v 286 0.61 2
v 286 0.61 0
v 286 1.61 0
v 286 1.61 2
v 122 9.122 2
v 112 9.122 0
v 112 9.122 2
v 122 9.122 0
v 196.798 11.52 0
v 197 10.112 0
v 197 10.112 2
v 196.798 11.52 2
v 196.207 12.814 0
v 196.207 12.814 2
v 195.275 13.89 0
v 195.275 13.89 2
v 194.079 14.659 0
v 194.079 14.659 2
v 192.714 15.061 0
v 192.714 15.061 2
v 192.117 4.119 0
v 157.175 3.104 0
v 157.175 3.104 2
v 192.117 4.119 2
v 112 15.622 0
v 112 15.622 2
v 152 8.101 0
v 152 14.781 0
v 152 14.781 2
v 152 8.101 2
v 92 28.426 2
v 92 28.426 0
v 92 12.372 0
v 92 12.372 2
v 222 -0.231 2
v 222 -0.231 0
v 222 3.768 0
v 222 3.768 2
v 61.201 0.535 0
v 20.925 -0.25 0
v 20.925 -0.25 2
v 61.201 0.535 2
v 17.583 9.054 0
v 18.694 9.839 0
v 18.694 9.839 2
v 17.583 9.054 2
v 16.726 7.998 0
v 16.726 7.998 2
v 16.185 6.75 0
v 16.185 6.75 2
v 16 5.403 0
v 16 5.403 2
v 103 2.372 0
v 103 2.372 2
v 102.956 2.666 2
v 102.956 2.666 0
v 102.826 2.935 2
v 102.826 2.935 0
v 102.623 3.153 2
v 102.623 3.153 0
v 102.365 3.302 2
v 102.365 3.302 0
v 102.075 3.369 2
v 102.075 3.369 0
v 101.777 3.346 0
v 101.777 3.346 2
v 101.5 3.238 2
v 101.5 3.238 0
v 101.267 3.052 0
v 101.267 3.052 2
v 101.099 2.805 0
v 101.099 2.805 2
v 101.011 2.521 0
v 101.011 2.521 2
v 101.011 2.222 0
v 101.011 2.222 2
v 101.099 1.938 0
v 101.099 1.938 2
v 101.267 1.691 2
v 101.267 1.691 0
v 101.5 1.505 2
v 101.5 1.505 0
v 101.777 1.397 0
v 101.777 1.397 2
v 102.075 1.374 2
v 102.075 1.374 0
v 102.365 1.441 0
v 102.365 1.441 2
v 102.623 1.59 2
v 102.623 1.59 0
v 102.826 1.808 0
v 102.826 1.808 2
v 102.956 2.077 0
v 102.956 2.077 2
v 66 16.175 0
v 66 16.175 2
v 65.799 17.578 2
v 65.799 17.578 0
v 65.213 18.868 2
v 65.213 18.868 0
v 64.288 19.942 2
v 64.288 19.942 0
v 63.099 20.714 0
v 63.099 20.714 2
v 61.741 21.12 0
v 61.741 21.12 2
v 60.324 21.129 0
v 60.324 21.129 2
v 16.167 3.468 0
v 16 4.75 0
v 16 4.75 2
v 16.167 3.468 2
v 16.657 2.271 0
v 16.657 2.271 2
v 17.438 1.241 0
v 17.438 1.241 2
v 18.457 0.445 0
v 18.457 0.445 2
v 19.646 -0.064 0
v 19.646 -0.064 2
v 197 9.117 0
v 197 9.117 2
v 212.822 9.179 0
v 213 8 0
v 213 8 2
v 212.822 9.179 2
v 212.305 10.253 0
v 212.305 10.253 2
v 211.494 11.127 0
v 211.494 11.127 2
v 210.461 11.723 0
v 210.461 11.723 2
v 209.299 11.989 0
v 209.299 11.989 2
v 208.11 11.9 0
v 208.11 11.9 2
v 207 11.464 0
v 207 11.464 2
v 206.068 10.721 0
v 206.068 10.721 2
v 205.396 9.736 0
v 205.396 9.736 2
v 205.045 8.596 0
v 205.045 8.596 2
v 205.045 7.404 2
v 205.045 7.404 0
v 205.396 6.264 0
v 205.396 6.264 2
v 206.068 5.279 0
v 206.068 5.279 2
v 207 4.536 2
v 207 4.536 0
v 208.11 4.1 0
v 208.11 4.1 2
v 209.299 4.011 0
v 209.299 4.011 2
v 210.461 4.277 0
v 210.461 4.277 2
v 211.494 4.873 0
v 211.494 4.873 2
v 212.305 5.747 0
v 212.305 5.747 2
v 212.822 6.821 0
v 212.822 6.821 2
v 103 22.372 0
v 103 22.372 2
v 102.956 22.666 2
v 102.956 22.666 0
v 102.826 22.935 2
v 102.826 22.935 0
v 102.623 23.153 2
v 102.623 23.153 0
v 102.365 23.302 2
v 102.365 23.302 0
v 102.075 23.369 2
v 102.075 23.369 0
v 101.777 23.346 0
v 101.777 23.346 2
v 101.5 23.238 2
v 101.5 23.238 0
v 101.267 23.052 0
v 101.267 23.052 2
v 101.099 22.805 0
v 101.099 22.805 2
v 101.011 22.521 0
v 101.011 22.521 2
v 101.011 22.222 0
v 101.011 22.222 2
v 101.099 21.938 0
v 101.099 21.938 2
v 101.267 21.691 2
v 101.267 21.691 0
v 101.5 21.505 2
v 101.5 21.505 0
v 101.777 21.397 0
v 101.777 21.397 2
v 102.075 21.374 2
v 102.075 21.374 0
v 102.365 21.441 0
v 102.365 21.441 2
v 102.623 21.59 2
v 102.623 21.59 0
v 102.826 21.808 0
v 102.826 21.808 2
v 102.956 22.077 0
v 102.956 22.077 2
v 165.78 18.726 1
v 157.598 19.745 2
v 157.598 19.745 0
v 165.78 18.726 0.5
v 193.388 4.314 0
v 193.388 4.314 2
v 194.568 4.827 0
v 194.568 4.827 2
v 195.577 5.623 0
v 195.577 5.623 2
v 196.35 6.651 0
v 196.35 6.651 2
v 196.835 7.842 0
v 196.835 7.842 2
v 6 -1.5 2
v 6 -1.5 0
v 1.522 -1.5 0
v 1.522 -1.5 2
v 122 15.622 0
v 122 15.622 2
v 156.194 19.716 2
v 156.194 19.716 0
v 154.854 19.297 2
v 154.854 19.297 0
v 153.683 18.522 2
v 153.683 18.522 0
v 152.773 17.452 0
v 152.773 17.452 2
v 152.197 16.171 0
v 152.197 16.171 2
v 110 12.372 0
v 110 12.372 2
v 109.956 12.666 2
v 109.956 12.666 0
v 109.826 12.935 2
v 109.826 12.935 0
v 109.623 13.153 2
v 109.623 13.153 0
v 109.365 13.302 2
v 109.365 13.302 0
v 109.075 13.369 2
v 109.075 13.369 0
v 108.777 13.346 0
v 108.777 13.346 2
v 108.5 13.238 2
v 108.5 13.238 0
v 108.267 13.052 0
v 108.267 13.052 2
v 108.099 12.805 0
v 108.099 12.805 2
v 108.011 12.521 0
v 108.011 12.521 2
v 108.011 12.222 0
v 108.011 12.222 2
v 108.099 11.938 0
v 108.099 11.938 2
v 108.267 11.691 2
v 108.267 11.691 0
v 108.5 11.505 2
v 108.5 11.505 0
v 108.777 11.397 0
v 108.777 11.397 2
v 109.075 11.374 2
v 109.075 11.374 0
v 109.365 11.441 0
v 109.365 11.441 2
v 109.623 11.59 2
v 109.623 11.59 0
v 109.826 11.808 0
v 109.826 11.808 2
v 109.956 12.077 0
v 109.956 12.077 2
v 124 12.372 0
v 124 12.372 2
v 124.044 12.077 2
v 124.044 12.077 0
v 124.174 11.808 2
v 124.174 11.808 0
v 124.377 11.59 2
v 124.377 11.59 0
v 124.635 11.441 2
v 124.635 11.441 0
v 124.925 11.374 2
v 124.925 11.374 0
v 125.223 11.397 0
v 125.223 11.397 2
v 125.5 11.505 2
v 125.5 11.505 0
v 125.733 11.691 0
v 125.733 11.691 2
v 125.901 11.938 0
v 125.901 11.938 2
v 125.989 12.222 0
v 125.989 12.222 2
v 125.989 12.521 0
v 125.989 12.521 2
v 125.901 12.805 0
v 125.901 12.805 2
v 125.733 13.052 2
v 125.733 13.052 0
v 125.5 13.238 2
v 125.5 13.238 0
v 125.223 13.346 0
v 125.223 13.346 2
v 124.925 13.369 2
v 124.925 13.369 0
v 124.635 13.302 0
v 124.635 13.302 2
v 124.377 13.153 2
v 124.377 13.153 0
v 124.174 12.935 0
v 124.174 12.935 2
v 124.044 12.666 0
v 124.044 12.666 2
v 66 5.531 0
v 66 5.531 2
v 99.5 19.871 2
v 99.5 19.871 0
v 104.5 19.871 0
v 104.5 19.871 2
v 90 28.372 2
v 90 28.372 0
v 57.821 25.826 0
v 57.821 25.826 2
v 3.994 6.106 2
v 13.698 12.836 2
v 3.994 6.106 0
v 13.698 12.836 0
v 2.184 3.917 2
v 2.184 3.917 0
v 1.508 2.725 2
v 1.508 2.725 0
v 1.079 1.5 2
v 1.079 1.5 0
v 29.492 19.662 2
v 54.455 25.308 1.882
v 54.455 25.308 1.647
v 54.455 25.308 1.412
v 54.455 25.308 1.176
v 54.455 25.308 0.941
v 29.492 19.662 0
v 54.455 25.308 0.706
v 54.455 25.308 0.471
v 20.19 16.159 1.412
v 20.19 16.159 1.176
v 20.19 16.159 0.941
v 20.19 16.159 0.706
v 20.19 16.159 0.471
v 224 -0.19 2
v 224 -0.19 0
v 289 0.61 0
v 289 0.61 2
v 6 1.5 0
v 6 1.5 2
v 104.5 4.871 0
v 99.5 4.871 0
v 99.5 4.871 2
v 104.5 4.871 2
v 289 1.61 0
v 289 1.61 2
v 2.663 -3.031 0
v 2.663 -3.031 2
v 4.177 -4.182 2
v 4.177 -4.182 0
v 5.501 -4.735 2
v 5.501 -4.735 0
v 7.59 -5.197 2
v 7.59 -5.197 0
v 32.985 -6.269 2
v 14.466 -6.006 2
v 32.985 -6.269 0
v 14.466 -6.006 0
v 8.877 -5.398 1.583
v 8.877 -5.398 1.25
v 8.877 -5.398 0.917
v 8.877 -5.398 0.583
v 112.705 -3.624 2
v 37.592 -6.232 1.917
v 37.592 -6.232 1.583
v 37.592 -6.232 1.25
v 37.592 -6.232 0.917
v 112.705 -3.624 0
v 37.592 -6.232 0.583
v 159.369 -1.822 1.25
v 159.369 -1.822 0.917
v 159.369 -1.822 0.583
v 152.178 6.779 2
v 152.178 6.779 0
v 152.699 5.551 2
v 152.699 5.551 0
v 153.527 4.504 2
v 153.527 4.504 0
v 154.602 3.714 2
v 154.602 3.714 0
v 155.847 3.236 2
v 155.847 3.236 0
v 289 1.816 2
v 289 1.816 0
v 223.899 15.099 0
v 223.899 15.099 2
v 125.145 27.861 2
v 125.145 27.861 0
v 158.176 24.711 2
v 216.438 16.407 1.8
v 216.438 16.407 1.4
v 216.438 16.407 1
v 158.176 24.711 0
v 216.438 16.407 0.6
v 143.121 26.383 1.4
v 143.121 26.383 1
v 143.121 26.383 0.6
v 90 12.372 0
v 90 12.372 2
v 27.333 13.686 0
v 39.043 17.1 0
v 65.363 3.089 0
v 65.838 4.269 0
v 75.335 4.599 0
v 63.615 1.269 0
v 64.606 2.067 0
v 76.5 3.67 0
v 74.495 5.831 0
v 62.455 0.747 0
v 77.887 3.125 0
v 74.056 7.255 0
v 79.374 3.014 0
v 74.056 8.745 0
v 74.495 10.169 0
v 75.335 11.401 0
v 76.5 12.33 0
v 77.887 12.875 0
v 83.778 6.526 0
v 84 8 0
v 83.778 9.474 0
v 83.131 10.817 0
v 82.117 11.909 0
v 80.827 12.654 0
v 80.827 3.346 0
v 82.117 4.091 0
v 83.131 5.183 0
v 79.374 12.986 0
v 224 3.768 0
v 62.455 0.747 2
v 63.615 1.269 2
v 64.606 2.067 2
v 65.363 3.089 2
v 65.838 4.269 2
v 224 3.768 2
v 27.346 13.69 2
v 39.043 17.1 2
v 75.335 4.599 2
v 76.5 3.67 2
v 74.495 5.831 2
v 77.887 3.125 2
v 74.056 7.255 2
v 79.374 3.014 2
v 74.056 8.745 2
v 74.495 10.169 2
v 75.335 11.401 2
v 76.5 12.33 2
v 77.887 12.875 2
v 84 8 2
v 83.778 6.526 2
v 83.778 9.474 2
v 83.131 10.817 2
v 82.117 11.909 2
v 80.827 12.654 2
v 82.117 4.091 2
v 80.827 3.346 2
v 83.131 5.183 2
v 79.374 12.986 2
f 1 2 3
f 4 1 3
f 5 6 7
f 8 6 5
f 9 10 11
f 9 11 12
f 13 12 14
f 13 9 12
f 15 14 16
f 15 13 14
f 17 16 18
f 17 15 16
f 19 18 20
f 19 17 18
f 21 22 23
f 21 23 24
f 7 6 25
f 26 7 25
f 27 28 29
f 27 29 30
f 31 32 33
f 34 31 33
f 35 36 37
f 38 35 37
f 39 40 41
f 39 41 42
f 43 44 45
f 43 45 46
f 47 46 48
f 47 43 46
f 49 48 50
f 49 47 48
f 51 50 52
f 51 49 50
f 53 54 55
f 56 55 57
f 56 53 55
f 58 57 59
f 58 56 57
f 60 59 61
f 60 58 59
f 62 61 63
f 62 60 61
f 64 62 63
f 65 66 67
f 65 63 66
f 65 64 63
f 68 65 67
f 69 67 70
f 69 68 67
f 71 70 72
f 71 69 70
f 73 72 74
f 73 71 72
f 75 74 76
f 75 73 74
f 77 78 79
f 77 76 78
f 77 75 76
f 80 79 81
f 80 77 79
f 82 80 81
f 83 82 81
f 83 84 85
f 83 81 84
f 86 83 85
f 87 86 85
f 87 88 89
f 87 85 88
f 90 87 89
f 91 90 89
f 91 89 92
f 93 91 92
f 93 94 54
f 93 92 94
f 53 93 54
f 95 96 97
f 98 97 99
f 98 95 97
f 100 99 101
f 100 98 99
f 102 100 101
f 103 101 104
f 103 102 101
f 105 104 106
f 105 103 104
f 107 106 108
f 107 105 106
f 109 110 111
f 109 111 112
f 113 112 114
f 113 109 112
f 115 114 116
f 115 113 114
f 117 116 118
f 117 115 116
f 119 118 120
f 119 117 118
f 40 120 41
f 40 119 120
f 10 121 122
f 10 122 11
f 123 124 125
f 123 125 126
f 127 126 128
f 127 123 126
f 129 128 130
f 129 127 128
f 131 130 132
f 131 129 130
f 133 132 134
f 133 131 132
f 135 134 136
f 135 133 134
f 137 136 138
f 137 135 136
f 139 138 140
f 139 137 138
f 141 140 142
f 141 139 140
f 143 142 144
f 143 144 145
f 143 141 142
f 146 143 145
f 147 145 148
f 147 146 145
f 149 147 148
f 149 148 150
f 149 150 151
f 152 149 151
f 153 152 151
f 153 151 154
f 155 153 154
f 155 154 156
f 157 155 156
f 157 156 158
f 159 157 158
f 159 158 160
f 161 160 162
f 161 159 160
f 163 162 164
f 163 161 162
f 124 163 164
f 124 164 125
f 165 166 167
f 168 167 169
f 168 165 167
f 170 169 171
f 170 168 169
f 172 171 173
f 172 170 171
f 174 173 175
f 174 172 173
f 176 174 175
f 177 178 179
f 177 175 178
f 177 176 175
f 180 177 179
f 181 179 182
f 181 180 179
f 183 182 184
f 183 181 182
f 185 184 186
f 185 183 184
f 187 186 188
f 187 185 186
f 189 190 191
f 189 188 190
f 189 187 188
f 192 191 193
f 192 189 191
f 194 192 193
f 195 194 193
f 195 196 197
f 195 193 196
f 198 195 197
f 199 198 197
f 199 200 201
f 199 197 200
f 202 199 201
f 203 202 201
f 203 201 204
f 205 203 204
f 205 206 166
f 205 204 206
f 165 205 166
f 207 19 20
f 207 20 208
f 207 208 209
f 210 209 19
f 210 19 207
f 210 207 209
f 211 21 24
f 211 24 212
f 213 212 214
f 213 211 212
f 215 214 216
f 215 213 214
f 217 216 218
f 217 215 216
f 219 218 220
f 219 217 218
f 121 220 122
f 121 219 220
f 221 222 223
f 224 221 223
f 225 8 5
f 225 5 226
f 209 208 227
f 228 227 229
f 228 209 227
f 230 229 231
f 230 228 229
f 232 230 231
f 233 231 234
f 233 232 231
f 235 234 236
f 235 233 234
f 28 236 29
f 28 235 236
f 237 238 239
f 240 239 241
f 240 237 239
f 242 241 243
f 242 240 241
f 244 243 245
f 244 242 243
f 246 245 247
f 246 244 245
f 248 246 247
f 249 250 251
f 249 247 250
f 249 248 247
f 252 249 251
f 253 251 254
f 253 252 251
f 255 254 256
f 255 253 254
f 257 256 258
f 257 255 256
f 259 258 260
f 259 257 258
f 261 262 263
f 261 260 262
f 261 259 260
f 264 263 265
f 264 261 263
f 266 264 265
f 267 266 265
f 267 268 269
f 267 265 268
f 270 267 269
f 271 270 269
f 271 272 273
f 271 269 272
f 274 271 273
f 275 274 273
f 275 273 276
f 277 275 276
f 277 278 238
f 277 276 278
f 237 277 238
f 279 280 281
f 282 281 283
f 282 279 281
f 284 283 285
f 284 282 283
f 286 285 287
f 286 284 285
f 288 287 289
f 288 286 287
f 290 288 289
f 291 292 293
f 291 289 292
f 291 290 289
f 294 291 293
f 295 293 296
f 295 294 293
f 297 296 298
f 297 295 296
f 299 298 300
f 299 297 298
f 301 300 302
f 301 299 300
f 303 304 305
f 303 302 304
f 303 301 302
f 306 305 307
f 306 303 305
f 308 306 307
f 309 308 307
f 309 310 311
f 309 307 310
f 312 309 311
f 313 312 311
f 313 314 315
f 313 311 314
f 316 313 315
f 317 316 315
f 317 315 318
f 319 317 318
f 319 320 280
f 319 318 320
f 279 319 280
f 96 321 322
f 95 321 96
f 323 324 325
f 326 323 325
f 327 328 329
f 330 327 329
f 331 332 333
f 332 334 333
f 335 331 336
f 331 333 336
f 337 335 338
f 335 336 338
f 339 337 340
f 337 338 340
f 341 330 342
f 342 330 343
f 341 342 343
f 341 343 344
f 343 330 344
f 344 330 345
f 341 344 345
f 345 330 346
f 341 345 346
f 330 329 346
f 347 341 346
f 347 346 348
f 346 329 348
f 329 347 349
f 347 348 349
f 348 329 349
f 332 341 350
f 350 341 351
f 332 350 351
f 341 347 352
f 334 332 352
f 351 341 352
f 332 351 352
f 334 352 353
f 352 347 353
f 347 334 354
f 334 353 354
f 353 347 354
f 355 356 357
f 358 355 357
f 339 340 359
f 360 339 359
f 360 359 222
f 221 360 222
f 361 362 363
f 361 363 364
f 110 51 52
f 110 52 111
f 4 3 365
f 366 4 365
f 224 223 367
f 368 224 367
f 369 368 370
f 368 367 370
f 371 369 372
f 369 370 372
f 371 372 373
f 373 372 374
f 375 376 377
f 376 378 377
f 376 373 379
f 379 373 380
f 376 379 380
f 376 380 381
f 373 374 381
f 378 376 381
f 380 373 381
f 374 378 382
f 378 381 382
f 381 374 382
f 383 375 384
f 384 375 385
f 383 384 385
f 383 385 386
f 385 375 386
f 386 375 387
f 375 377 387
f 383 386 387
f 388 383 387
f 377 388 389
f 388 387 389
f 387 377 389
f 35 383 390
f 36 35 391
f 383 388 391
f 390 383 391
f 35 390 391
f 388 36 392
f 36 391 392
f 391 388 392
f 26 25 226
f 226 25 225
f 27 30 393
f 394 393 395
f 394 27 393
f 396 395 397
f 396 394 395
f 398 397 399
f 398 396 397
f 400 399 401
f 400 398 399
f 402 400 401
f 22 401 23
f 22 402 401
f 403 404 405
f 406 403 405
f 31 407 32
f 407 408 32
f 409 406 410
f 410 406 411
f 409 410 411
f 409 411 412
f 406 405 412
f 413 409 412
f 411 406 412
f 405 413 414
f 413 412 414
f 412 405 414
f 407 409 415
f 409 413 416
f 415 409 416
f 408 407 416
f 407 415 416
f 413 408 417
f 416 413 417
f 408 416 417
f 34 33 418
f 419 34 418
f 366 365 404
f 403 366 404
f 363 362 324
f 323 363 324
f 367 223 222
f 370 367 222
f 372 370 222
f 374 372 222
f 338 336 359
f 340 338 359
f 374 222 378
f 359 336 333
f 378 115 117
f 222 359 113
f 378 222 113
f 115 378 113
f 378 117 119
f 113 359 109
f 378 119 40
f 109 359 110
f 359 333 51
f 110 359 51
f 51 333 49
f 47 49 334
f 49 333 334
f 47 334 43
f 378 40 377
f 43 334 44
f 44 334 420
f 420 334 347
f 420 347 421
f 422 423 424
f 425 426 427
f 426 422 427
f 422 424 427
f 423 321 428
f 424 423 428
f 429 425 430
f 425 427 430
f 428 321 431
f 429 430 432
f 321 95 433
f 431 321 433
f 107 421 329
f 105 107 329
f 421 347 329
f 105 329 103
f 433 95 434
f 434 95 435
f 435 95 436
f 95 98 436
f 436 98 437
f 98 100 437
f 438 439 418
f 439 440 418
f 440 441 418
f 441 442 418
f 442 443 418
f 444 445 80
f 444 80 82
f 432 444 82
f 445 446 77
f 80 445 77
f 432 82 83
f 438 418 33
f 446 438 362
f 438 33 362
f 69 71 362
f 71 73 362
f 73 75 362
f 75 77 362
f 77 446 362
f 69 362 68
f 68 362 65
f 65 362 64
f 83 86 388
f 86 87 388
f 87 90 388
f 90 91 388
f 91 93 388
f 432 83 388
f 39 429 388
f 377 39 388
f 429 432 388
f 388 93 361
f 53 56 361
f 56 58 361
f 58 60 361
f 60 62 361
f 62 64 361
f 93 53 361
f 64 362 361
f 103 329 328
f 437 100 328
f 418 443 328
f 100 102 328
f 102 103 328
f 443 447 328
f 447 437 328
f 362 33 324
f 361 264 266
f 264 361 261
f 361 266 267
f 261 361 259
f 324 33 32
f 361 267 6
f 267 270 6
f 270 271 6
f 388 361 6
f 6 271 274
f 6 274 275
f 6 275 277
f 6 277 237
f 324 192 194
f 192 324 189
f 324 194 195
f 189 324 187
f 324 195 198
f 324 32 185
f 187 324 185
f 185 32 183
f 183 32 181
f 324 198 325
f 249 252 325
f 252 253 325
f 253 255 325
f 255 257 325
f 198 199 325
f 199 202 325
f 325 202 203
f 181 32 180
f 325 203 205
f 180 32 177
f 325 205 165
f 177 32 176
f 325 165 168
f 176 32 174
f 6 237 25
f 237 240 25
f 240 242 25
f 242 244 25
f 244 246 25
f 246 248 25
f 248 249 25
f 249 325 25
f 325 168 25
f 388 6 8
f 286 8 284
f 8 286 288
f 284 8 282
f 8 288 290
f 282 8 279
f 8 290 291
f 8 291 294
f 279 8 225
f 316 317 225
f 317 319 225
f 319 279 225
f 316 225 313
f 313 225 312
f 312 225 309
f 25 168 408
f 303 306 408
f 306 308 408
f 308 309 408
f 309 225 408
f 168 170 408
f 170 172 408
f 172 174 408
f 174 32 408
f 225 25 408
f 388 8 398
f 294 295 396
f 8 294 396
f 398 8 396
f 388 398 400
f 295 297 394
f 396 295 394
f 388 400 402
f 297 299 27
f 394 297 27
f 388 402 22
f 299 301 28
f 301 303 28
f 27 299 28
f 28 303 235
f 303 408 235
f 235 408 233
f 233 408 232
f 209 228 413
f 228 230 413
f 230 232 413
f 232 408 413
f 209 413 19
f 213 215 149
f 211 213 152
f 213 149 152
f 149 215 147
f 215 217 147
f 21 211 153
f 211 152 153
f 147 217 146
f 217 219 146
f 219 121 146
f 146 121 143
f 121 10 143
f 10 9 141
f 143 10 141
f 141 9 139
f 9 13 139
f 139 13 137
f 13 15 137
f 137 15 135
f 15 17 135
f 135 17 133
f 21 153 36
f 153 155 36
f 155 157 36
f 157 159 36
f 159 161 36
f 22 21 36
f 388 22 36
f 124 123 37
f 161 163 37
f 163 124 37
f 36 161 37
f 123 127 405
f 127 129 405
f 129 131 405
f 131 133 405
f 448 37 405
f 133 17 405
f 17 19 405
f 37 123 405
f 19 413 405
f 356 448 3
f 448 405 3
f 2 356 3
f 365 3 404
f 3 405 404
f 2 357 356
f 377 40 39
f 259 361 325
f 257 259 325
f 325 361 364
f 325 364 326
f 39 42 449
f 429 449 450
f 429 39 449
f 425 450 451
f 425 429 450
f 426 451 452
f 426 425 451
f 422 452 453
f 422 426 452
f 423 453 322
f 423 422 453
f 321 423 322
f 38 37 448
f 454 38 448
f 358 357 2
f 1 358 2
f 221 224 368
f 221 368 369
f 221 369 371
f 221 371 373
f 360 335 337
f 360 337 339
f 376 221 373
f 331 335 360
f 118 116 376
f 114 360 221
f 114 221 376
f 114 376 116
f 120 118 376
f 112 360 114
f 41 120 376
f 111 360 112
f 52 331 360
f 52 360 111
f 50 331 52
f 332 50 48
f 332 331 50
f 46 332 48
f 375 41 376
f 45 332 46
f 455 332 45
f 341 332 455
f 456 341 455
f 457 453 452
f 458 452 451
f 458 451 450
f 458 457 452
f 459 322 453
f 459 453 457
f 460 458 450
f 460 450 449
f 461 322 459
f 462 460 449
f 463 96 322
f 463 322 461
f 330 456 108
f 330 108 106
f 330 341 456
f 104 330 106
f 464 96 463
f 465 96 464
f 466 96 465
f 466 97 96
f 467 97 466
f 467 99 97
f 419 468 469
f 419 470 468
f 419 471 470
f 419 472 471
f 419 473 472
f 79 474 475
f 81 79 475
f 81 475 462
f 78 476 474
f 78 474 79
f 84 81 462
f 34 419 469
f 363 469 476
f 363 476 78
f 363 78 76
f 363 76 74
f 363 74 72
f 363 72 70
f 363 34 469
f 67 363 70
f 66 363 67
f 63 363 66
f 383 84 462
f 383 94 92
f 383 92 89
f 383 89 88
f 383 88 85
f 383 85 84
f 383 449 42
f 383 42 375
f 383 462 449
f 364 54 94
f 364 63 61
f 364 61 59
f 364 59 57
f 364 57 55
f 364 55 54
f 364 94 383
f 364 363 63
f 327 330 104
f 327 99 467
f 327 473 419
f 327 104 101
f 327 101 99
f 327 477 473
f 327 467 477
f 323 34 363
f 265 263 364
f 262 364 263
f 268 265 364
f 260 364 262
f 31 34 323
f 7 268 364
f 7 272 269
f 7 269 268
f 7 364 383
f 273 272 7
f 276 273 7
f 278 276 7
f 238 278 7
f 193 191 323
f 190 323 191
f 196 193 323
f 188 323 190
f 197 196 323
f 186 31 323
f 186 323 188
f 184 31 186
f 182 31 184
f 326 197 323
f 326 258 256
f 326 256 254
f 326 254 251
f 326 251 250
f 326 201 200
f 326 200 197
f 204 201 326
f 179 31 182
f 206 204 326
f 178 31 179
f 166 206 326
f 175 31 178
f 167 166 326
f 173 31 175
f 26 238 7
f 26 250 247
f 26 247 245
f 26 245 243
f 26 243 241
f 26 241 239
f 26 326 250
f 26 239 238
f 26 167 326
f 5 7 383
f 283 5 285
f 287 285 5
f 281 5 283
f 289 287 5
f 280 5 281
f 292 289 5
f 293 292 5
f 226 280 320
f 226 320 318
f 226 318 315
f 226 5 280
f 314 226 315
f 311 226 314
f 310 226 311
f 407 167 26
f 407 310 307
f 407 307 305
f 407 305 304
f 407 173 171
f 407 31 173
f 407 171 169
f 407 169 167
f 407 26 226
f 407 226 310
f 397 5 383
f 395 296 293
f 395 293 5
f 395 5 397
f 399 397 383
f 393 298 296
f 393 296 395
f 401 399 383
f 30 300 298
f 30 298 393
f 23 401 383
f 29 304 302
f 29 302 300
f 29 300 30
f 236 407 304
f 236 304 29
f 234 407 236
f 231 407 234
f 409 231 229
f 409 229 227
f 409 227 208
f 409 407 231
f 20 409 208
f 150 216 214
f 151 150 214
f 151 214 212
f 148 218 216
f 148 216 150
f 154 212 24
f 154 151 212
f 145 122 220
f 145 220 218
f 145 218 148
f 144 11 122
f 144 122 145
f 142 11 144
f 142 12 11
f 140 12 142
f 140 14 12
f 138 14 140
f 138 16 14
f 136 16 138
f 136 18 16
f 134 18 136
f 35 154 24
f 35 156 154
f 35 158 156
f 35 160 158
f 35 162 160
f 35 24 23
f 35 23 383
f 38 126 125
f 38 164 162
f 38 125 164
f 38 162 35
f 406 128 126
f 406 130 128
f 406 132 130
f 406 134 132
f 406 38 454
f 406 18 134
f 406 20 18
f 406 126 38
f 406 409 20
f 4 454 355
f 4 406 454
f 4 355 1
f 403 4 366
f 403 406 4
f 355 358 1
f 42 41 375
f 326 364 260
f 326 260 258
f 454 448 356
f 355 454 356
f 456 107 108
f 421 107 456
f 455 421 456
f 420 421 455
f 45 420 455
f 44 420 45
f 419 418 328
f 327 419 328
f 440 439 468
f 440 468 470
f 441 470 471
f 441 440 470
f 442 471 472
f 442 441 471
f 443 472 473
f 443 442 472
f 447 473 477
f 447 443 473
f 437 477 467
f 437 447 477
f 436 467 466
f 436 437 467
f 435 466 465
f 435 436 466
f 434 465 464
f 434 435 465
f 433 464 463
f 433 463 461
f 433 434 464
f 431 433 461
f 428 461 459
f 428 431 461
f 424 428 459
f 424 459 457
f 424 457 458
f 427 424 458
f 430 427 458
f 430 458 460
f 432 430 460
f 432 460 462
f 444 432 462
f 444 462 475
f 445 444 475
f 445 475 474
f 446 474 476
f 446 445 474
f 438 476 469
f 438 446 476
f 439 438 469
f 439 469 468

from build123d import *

# Parameters (mm, degrees)
SKETCH_1_R          = 5
SKETCH_1_R_2        = 4
EXTRUDE_1_DEPTH     = 2
SKETCH_3_R          = 1
SKETCH_3_W          = 10
SKETCH_3_H          = 6.5
SKETCH_3_W_2        = 5
SKETCH_3_H_2        = 15
CUT_EXTRUDE_2_DEPTH = 291.413778556


with BuildPart() as part:
    # 草图1 → 凸台-拉伸1 (new body)
    with BuildSketch(Plane.XY):
        with BuildLine():
            Line((90, 12.3715), (90, 28.372426217))
            add(Edge.make_bspline(
                [(90, 28.372426217), (89.259446982, 28.350928743), (82.363996343, 28.13322439), (72.403347361, 27.586524792), (60.185862052, 26.226268085), (51.080991088, 24.79810862), (42.033943524, 23.000087944), (34.581994337, 21.174922903), (28.697351661, 19.44563851), (24.361981086, 17.983441115), (20.174828998, 16.207949367), (16.078941989, 14.139912989), (12.040296713, 11.946766626), (8.14011433, 9.56039573), (5.153679337, 7.316395724), (3.100060439, 5.200618052), (1.813825976, 3.470730924), (1.237398467, 2.180506339), (1.085380705, 1.529058937), (1.078882286, 1.5)],
                knots=[0.345773533, 0.345773533, 0.345773533, 0.345773533, 0.349398211, 0.379527288, 0.394591827, 0.409656366, 0.424720905, 0.439785444, 0.447317713, 0.454849983, 0.462382252, 0.469914522, 0.477446791, 0.484979061, 0.49251133, 0.496277465, 0.5000436, 0.503809734, 0.503985678, 0.503985678, 0.503985678, 0.503985678], degree=3))
            Line((1.078882286, 1.5), (6, 1.5))
            Line((6, 1.5), (6, -1.5))
            Line((6, -1.5), (1.522379628, -1.5))
            add(Edge.make_bspline(
                [(1.522379628, -1.5), (1.617903461, -1.678770523), (2.068186491, -2.42442122), (3.143139608, -3.601090845), (4.854253, -4.619355756), (6.927567017, -5.105597911), (9.209034621, -5.454839075), (12.219971865, -5.84289763), (16.020132359, -6.14266222), (20.609524976, -6.2611368), (25.231457517, -6.286948592), (31.397380169, -6.280305851), (39.107274969, -6.240736398), (48.336813051, -6.022096429), (57.579935967, -5.612990736), (66.840654471, -5.242934226), (76.096556555, -4.921715721), (88.435998513, -4.515955408), (103.853120896, -3.973102953), (122.354625015, -3.248110744), (140.857835973, -2.495489966), (159.368527813, -1.804089638), (177.884173919, -1.222493213), (196.4033921, -0.774877257), (211.106034353, -0.46143934), (219.638958118, -0.28014938), (222, -0.231405833)],
                knots=[0.510182255, 0.510182255, 0.510182255, 0.510182255, 0.511342004, 0.515108139, 0.518874273, 0.522640408, 0.526406543, 0.530172677, 0.537704947, 0.545237216, 0.552769486, 0.560301755, 0.575366294, 0.590430833, 0.605495372, 0.620559911, 0.63562445, 0.650688989, 0.680818067, 0.710947144, 0.741076222, 0.7712053, 0.801334378, 0.831463456, 0.861592533, 0.873117312, 0.873117312, 0.873117312, 0.873117312], degree=3))
            Line((222, -0.231405833), (222, 3.768284765))
            Line((222, 3.768284765), (224, 3.768284765))
            Line((224, 3.768284765), (224, -0.190486213))
            add(Edge.make_bspline(
                [(224, -0.190486213), (227.14486696, -0.126773539), (236.463303784, 0.052517956), (251.961175933, 0.256656825), (270.471854229, 0.429163033), (282.824771355, 0.587434741), (289, 0.610062865)],
                knots=[0.8763714, 0.8763714, 0.8763714, 0.8763714, 0.891721611, 0.921850689, 0.951979767, 0.982108845, 0.982108845, 0.982108845, 0.982108845], degree=3))
            Line((289, 0.610062865), (286, 0.610062865))
            Line((286, 0.610062865), (286, 1.610062865))
            Line((286, 1.610062865), (289, 1.610062865))
            Line((289, 1.610062865), (289, 1.816246039))
            add(Edge.make_bspline(
                [(289, 1.816246039), (276.957314444, 4.502285023), (258.861554155, 8.397620333), (234.648247971, 13.152786595), (216.448478593, 16.478914183), (198.182873559, 19.371550405), (179.850571346, 21.924148488), (161.503162682, 24.358614825), (143.127892269, 26.473190985), (124.712239059, 28.043780086), (107.661076739, 28.627794226), (96.749283398, 28.541845307), (92, 28.425883181)],
                knots=[0.017978355, 0.017978355, 0.017978355, 0.017978355, 0.07823651, 0.108365588, 0.138494666, 0.168623744, 0.198752821, 0.228881899, 0.259010977, 0.289140055, 0.319269133, 0.342510787, 0.342510787, 0.342510787, 0.342510787], degree=3))
            Line((92, 28.425883181), (92, 12.3715))
            Line((92, 12.3715), (90, 12.3715))
        make_face()
        with Locations((79, 8)):
            Circle(SKETCH_1_R, mode=Mode.SUBTRACT)
        with Locations((209, 8)):
            Circle(SKETCH_1_R_2, mode=Mode.SUBTRACT)
    extrude(amount=EXTRUDE_1_DEPTH)

    # 草图3 → 切除-拉伸2 (cut, through all)
    with BuildSketch(Plane.XY):
        with Locations((109, 12.3715)):
            Circle(SKETCH_3_R)
        with Locations(Location((125, 12.3715, 0), (0, 0, 180))):
            Circle(SKETCH_3_R)
        with Locations((102, 22.3715)):
            Circle(SKETCH_3_R)
        with Locations((102, 2.3715)):
            Circle(SKETCH_3_R)
        with BuildLine():
            Line((16, 5.402967421), (16, 4.749566555))
            ThreePointArc((16, 4.749566555), (17.438114785, 1.240581842), (20.925189485, -0.249873753))
            add(Edge.make_bspline(
                [(20.925189485, -0.249873753), (22.882709708, -0.279165651), (24.840641991, -0.283525018), (29.041829536, -0.283940324), (31.285240614, -0.278329339), (38.015485271, -0.240317871), (42.502372715, -0.172195541), (51.471753165, 0.109493271), (55.953809182, 0.320868582), (60.691665275, 0.51398671), (60.94634527, 0.524299853), (61.201027705, 0.534547785)],
                knots=[0.014317845, 0.014317845, 0.014317845, 0.014317845, 0.020191056, 0.020191056, 0.026921408, 0.026921408, 0.040382112, 0.040382112, 0.053842816, 0.053842816, 0.054607483, 0.054607483, 0.054607483, 0.054607483], degree=3))
            ThreePointArc((61.201027705, 0.534547785), (64.60590755, 2.066774182), (66, 5.530504936))
            Line((66, 5.530504936), (66, 16.175207171))
            ThreePointArc((66, 16.175207171), (64.287676463, 19.942325894), (60.32352661, 21.129234195))
            add(Edge.make_bspline(
                [(60.32352661, 21.129234195), (59.143282742, 20.968071656), (57.964431768, 20.796736398), (53.109249428, 20.046773379), (49.445857595, 19.384253181), (42.158673028, 17.868714577), (38.533379611, 17.019586343), (33.148990447, 15.546220745), (31.362942012, 15.022439399), (27.821005995, 13.880218625), (26.067238608, 13.253271835), (22.635818059, 11.812670552), (20.957942753, 11.004847704), (19.099592195, 10.049689097), (18.896441621, 9.944700093), (18.693547477, 9.839213217)],
                knots=[0.029920383, 0.029920383, 0.029920383, 0.029920383, 0.033494004, 0.033494004, 0.044658672, 0.044658672, 0.05582334, 0.05582334, 0.061405674, 0.061405674, 0.066988008, 0.066988008, 0.072570342, 0.072570342, 0.073256353, 0.073256353, 0.073256353, 0.073256353], degree=3))
            ThreePointArc((18.693547477, 9.839213217), (16.726110517, 7.997937304), (16, 5.402967421))
        make_face()
        with Locations((117, 12.3715)):
            Rectangle(SKETCH_3_W, SKETCH_3_H)
        with Locations((102, 12.3715)):
            Rectangle(SKETCH_3_W_2, SKETCH_3_H_2)
        with BuildLine():
            Line((152, 14.780862449), (152, 8.10116079))
            ThreePointArc((152, 8.10116079), (153.526907054, 4.504269717), (157.175050156, 3.104225985))
            add(Edge.make_bspline(
                [(157.175050156, 3.104225985), (160.142149061, 3.208167931), (163.109842262, 3.308184708), (170.732455506, 3.552774746), (175.388689917, 3.690754395), (184.07020031, 3.924521784), (188.094738333, 4.024115619), (192.117455336, 4.118639618)],
                knots=[0.710145027, 0.710145027, 0.710145027, 0.710145027, 0.75, 0.75, 0.8125, 0.8125, 0.866546799, 0.866546799, 0.866546799, 0.866546799], degree=3))
            ThreePointArc((192.117455336, 4.118639618), (195.576819584, 5.623499462), (197, 9.117259852))
            Line((197, 9.117259852), (197, 10.112022474))
            ThreePointArc((197, 10.112022474), (195.77958016, 13.385365385), (192.714090476, 15.060767244))
            add(Edge.make_bspline(
                [(192.714090476, 15.060767244), (191.944613201, 15.171800732), (191.174825659, 15.282099728), (186.308954619, 15.974755997), (182.203786583, 16.539615577), (173.988030512, 17.653320176), (169.883033971, 18.199812389), (163.05203857, 19.07552627), (160.324682912, 19.416350788), (157.598275441, 19.744940057)],
                knots=[0.488248297, 0.488248297, 0.488248297, 0.488248297, 0.5, 0.5, 0.5625, 0.5625, 0.625, 0.625, 0.666561376, 0.666561376, 0.666561376, 0.666561376], degree=3))
            ThreePointArc((157.598275441, 19.744940057), (153.682725306, 18.521943657), (152, 14.780862449))
        make_face()
    extrude(amount=CUT_EXTRUDE_2_DEPTH, mode=Mode.SUBTRACT)


solid = part.part
